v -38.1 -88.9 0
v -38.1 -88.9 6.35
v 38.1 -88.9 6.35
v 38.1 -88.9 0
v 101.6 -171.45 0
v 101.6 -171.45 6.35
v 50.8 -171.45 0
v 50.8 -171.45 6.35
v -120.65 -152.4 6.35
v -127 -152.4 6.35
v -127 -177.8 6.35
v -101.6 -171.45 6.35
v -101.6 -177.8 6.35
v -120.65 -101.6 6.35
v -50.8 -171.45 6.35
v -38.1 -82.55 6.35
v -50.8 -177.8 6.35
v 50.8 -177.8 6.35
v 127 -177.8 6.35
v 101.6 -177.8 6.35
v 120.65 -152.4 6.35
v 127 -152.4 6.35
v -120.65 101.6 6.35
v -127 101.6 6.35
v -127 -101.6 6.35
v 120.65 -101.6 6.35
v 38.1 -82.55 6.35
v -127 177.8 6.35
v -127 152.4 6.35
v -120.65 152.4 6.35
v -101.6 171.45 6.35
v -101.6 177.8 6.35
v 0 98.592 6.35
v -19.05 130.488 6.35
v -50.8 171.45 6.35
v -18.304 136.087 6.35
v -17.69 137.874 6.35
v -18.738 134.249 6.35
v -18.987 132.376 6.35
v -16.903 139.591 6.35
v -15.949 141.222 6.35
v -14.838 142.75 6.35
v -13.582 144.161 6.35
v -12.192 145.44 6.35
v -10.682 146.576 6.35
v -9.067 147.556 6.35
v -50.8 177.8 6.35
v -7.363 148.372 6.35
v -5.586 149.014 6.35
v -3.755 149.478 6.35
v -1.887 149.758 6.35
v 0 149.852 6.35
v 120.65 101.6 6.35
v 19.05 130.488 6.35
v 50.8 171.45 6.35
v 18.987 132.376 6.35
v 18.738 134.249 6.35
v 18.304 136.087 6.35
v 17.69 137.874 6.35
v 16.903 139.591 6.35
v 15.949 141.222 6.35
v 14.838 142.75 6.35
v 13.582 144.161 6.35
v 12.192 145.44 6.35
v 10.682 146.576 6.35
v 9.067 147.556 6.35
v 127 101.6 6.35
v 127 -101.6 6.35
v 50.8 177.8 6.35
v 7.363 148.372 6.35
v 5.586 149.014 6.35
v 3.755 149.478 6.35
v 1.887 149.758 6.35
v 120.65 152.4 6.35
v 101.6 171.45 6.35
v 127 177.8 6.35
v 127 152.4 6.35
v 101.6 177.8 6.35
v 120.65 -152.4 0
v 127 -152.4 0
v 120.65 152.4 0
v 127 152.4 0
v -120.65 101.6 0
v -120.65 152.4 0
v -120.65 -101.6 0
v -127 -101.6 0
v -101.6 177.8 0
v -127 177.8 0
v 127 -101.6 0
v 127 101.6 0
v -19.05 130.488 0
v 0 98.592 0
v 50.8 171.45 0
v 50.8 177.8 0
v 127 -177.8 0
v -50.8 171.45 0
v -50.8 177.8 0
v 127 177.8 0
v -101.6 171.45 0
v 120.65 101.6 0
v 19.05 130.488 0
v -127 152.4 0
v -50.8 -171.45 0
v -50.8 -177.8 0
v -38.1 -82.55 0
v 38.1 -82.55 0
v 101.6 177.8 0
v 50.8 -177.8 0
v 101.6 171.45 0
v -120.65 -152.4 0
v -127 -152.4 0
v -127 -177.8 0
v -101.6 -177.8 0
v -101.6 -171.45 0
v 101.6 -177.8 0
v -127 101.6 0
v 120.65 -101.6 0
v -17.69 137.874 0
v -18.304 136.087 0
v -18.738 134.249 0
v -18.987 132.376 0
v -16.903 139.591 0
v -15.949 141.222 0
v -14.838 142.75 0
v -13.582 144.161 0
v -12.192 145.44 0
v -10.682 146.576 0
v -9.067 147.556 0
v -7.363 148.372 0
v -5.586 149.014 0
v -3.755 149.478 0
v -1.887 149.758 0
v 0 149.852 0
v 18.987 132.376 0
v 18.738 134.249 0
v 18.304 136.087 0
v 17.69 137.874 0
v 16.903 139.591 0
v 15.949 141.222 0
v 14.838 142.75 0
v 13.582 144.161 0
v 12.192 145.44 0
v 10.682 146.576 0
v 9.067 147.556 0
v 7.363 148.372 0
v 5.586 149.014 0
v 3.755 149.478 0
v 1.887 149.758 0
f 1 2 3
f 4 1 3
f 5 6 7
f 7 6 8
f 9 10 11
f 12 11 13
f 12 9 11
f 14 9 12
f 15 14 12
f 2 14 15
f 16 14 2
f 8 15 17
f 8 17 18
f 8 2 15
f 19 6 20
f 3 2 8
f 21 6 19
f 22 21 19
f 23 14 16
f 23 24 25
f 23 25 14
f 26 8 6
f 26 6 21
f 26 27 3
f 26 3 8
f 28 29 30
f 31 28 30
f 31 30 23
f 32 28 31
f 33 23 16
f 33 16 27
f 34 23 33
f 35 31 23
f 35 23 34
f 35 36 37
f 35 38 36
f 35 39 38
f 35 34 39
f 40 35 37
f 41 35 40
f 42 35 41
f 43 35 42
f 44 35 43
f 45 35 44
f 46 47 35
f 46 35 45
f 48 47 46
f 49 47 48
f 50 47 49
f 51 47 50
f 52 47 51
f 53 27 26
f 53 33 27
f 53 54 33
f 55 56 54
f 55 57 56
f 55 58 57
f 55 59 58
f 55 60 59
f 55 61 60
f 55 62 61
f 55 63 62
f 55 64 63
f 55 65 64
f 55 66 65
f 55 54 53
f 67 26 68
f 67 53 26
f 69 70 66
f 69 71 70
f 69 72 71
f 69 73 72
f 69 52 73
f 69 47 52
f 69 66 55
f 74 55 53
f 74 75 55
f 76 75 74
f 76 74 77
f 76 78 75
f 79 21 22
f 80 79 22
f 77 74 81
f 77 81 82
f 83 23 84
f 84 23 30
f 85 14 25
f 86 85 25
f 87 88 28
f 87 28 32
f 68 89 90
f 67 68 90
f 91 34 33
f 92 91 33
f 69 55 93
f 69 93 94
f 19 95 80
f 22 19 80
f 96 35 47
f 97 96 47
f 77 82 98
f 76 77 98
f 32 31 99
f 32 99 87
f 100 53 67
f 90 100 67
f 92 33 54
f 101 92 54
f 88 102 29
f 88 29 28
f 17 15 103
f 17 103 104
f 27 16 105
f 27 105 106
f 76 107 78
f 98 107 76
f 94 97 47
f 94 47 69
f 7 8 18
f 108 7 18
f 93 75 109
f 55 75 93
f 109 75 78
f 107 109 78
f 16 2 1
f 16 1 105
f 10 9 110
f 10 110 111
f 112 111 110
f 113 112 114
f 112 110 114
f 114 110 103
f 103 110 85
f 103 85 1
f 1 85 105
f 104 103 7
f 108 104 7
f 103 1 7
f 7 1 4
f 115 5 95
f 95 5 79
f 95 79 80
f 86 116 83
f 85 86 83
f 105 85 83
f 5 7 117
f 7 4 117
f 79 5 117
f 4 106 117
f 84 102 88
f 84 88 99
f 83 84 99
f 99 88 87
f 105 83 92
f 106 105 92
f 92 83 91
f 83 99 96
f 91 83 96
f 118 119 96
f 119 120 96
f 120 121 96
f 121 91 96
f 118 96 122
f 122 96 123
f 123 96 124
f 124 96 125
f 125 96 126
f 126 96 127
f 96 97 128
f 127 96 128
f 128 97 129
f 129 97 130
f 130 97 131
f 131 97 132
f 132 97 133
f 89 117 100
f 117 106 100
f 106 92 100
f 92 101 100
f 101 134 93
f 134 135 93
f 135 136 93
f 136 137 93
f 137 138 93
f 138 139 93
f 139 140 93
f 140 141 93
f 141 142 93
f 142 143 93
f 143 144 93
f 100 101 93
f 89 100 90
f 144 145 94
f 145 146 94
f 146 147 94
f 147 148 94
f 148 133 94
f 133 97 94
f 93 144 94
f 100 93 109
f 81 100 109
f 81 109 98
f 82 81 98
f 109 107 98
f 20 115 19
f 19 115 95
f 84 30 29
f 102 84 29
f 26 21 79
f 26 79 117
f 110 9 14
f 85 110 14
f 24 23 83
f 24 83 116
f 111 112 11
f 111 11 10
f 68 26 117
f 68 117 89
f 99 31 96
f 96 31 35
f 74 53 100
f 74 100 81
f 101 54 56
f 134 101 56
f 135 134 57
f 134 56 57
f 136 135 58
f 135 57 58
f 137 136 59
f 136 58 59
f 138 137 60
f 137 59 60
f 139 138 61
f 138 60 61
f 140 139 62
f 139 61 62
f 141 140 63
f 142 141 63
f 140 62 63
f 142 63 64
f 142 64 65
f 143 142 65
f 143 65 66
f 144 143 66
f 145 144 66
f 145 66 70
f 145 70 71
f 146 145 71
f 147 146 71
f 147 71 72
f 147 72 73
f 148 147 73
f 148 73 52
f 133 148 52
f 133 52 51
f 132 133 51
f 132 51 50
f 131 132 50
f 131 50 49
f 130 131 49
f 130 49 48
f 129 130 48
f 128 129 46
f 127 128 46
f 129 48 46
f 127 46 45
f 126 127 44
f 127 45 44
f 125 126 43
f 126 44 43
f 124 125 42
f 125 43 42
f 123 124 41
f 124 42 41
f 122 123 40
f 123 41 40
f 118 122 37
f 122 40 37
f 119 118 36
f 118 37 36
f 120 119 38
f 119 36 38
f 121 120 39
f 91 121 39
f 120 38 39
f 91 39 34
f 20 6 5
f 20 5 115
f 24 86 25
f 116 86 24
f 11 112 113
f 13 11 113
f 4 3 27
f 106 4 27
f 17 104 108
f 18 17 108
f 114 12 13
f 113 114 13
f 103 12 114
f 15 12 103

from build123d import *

# Parameters (mm, degrees)
F0_W             = 254
F0_H             = 355.6
F1_DEPTH         = 6.35
F2_W             = 50.8
F2_H             = 6.35
F3_DEPTH         = 6.351
F3_COPIES2_COUNT = 2
F3_COPIES3_COUNT = 2
F3_COPIES3_ANGLE = 90
F3_COPIES4_COUNT = 2
F3_COPIES4_ANGLE = 90
F4_W             = 6.35
F4_H             = 50.8
F5_DEPTH         = 25.4
F6_W             = 76.2
F6_H             = 6.35
F7_DEPTH         = 25.4
F9_DEPTH         = 25.4


# Not quite as in the source:
# - a pattern or mirror of a feature is missing from the dataset's text; its kind, count and spacing are read off the source's solid


with BuildPart() as f1:
    # F0 (on Top) → F1 (new body)
    with BuildSketch(Plane.XY):
        Rectangle(F0_W, F0_H)
    extrude(amount=F1_DEPTH)

    # F2 (on face) → F3 (cut, through all)
    with BuildSketch(Plane.XY.offset(6.35)):
        with Locations((-76.2, 174.625)):
            Rectangle(F2_W, F2_H)
    f3 = extrude(amount=-F3_DEPTH, mode=Mode.SUBTRACT)

    # F3_copies: F3 across plane
    add(f3.mirror(Plane(origin=(0, 0, 0), x_dir=(0, 0, -1), z_dir=(0, -1, 0))), mode=Mode.SUBTRACT)

    # F3_copies1: F3 across plane
    add(f3.mirror(Plane(origin=(0, 0, 0), x_dir=(0, 0, 1), z_dir=(1, 0, 0))), mode=Mode.SUBTRACT)

    # F3_copies2: F3 ×2 about axis
    f3_copies2_axis = Axis((0, 0, 0), (0, 0, 1))
    for i in range(1, F3_COPIES2_COUNT):
        add(f3.rotate(f3_copies2_axis, i * 360 / F3_COPIES2_COUNT), mode=Mode.SUBTRACT)

    # F3_copies3: F3 ×2 about axis
    f3_copies3_axis = Axis((50.8, 0, 0), (0, 0, 1))
    for i in range(1, F3_COPIES3_COUNT):
        add(f3.rotate(f3_copies3_axis, i * F3_COPIES3_ANGLE / (F3_COPIES3_COUNT - 1)), mode=Mode.SUBTRACT)

    # F3_copies4: F3 ×2 about axis
    f3_copies4_axis = Axis((-76.2, 127, 0), (0, 0, 1))
    for i in range(1, F3_COPIES4_COUNT):
        add(f3.rotate(f3_copies4_axis, i * F3_COPIES4_ANGLE / (F3_COPIES4_COUNT - 1)), mode=Mode.SUBTRACT)

    # F4 (on face) → F5 (cut)
    with BuildSketch(Plane.XY.offset(6.35)):
        with Locations((123.825, 127)):
            Rectangle(F4_W, F4_H)
        with Locations((123.825, -127)):
            Rectangle(F4_W, F4_H)
    extrude(amount=-F5_DEPTH, mode=Mode.SUBTRACT)

    # F6 (on face) → F7 (cut)
    with BuildSketch(Plane.XY.offset(6.35)):
        with Locations((0, -85.725)):
            Rectangle(F6_W, F6_H)
    extrude(amount=-F7_DEPTH, mode=Mode.SUBTRACT)

    # F8 (on face) → F9 (cut)
    with BuildSketch(Plane.XY.offset(6.35)):
        with BuildLine():
            Line((0, 98.5919060208), (19.05, 130.4880061596))
            ThreePointArc((19.05, 130.4880061596), (0, 149.8517760723), (-19.05, 130.4880061596))
            Line((-19.05, 130.4880061596), (0, 98.5919060208))
        make_face()
    extrude(amount=-F9_DEPTH, mode=Mode.SUBTRACT)


solid = f1.part
